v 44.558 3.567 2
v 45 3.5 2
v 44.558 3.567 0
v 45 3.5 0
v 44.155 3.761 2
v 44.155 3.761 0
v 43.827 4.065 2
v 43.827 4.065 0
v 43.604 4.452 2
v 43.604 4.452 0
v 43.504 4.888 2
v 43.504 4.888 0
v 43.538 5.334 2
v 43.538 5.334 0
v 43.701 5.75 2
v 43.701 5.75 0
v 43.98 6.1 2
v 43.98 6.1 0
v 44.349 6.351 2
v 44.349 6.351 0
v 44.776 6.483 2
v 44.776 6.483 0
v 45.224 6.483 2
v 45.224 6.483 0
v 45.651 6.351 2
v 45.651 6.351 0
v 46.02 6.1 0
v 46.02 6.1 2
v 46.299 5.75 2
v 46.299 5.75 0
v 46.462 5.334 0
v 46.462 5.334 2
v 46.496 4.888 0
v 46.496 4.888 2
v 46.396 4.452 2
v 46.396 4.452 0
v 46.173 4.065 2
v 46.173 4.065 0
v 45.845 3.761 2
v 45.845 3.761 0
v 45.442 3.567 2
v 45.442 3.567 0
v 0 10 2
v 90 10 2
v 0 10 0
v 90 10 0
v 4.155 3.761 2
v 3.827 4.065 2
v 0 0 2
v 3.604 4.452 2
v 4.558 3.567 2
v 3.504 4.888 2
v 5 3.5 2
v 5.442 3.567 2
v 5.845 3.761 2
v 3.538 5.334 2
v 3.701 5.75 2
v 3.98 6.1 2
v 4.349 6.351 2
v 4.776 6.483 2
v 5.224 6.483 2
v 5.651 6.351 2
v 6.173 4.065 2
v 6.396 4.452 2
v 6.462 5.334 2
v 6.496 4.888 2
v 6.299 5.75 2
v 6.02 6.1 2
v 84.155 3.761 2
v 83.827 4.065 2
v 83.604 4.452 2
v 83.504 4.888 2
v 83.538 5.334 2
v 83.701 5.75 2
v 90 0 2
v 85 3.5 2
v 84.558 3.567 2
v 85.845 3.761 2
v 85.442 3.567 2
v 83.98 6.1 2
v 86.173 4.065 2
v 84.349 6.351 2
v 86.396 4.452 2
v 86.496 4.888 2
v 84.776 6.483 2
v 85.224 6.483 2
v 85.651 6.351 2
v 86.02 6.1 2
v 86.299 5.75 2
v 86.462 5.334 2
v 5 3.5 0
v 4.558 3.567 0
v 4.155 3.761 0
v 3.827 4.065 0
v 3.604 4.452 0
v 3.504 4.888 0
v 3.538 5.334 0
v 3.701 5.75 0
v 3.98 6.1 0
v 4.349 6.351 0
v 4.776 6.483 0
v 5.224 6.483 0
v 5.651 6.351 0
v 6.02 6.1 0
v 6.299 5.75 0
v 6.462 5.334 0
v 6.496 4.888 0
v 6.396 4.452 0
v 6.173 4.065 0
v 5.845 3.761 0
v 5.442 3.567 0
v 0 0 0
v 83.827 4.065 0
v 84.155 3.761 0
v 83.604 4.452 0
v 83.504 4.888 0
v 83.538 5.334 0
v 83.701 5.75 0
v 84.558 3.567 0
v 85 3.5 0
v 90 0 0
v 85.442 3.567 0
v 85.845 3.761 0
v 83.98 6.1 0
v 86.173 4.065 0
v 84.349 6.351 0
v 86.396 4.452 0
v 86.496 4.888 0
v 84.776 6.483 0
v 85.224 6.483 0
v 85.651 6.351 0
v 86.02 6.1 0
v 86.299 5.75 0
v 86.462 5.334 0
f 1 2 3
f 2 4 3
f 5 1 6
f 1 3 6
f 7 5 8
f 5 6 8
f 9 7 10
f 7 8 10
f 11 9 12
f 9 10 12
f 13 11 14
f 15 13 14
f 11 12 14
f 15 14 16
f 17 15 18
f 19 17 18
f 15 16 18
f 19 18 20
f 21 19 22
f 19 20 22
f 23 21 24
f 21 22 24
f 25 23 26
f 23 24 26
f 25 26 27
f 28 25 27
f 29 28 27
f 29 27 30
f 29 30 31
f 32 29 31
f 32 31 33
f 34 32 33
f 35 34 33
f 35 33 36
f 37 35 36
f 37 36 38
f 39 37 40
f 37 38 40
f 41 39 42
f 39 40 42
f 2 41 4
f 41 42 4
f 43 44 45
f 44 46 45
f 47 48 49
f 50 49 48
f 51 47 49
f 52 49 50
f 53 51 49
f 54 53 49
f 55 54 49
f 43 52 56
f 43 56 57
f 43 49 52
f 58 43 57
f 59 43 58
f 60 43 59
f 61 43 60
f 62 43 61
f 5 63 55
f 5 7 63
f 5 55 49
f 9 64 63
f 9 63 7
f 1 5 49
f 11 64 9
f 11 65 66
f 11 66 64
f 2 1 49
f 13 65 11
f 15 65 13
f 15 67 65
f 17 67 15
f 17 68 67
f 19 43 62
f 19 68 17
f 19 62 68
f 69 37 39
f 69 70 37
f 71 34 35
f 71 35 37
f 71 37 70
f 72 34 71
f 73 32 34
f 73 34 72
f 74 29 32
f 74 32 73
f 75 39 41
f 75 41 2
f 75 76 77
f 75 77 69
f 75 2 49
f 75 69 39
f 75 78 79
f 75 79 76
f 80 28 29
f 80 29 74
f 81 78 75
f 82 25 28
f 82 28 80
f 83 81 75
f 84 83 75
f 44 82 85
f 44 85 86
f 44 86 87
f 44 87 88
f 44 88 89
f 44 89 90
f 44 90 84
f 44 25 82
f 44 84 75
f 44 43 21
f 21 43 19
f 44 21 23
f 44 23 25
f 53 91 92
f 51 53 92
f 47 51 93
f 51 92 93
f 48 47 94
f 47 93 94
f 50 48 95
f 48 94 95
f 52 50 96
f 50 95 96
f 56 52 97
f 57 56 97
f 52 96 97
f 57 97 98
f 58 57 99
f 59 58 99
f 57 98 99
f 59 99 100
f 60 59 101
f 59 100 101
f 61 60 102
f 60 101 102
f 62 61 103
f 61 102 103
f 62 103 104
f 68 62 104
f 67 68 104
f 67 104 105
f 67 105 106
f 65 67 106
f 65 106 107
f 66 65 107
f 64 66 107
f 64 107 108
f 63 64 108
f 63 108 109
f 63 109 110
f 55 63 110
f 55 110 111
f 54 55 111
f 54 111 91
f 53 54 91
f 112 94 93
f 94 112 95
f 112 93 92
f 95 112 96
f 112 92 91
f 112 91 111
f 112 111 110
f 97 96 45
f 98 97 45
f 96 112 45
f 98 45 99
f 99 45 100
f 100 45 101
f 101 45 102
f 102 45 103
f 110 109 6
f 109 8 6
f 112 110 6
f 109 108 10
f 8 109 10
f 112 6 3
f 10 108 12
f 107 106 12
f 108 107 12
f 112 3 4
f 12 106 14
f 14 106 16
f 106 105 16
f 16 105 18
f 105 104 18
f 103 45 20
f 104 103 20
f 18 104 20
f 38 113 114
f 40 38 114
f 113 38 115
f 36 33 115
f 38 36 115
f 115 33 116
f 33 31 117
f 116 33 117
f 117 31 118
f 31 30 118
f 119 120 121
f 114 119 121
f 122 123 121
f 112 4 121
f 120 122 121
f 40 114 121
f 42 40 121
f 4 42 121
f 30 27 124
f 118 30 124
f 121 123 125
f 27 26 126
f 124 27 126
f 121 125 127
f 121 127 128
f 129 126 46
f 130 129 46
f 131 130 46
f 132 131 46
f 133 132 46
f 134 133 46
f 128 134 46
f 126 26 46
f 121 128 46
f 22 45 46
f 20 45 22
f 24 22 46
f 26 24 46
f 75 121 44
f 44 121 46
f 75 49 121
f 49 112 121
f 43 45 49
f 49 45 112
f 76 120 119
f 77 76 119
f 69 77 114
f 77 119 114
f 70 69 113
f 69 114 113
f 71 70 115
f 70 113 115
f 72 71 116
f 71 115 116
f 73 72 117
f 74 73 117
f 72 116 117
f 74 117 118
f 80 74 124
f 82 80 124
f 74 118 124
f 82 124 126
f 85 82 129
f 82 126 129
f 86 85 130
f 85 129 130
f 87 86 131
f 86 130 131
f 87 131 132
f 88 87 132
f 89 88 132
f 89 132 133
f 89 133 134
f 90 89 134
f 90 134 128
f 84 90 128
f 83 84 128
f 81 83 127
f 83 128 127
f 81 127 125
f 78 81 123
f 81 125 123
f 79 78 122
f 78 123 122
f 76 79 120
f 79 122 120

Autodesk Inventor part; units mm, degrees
ref_plane "YZ Plane" through (0, 0, 0) normal (1, 0, 0) x (0, 1, 0)
ref_plane "XZ Plane" through (0, 0, 0) normal (0, 1, 0) x (-1, 0, 0)
ref_plane "XY Plane" through (0, 0, 0) normal (0, 0, 1) x (1, 0, 0)
sketch "スケッチ1" plane through (0, 0, 0) normal (0, 0, 1) x (1, 0, 0)
  line L0 (0, 0) -> (90, 0)
  line L1 (90, 0) -> (90, 10)
  line L2 (90, 10) -> (0, 10)
  line L3 (0, 10) -> (0, 0)
  dimension "d0" = 90
  dimension "d1" = 10
extrude "押し出し1" add sketch "スケッチ1" along normal blind 2
sketch "スケッチ2" plane through (0, 0, 2) normal (0, 0, 1) x (1, 0, 0)
  line L0 (0, 10) -> (0, 0) projected
  line L1 (90, 0) -> (90, 10) projected
  line L2 (0, 0) -> (90, 0) projected
  point P0 (5, 5)
  point P1 (45, 5)
  point P2 (85, 5)
  dimension "d13" = 5
  dimension "d14" = 5
  dimension "d15" = 40
  dimension "d16" = 5
  dimension "d17" = 5
hole "穴1" at (5, 5, 2) at (45, 5, 2) at (85, 5, 2) direction (0, 0, -1) diameter 3 end through all
properties part number "長いほう"
